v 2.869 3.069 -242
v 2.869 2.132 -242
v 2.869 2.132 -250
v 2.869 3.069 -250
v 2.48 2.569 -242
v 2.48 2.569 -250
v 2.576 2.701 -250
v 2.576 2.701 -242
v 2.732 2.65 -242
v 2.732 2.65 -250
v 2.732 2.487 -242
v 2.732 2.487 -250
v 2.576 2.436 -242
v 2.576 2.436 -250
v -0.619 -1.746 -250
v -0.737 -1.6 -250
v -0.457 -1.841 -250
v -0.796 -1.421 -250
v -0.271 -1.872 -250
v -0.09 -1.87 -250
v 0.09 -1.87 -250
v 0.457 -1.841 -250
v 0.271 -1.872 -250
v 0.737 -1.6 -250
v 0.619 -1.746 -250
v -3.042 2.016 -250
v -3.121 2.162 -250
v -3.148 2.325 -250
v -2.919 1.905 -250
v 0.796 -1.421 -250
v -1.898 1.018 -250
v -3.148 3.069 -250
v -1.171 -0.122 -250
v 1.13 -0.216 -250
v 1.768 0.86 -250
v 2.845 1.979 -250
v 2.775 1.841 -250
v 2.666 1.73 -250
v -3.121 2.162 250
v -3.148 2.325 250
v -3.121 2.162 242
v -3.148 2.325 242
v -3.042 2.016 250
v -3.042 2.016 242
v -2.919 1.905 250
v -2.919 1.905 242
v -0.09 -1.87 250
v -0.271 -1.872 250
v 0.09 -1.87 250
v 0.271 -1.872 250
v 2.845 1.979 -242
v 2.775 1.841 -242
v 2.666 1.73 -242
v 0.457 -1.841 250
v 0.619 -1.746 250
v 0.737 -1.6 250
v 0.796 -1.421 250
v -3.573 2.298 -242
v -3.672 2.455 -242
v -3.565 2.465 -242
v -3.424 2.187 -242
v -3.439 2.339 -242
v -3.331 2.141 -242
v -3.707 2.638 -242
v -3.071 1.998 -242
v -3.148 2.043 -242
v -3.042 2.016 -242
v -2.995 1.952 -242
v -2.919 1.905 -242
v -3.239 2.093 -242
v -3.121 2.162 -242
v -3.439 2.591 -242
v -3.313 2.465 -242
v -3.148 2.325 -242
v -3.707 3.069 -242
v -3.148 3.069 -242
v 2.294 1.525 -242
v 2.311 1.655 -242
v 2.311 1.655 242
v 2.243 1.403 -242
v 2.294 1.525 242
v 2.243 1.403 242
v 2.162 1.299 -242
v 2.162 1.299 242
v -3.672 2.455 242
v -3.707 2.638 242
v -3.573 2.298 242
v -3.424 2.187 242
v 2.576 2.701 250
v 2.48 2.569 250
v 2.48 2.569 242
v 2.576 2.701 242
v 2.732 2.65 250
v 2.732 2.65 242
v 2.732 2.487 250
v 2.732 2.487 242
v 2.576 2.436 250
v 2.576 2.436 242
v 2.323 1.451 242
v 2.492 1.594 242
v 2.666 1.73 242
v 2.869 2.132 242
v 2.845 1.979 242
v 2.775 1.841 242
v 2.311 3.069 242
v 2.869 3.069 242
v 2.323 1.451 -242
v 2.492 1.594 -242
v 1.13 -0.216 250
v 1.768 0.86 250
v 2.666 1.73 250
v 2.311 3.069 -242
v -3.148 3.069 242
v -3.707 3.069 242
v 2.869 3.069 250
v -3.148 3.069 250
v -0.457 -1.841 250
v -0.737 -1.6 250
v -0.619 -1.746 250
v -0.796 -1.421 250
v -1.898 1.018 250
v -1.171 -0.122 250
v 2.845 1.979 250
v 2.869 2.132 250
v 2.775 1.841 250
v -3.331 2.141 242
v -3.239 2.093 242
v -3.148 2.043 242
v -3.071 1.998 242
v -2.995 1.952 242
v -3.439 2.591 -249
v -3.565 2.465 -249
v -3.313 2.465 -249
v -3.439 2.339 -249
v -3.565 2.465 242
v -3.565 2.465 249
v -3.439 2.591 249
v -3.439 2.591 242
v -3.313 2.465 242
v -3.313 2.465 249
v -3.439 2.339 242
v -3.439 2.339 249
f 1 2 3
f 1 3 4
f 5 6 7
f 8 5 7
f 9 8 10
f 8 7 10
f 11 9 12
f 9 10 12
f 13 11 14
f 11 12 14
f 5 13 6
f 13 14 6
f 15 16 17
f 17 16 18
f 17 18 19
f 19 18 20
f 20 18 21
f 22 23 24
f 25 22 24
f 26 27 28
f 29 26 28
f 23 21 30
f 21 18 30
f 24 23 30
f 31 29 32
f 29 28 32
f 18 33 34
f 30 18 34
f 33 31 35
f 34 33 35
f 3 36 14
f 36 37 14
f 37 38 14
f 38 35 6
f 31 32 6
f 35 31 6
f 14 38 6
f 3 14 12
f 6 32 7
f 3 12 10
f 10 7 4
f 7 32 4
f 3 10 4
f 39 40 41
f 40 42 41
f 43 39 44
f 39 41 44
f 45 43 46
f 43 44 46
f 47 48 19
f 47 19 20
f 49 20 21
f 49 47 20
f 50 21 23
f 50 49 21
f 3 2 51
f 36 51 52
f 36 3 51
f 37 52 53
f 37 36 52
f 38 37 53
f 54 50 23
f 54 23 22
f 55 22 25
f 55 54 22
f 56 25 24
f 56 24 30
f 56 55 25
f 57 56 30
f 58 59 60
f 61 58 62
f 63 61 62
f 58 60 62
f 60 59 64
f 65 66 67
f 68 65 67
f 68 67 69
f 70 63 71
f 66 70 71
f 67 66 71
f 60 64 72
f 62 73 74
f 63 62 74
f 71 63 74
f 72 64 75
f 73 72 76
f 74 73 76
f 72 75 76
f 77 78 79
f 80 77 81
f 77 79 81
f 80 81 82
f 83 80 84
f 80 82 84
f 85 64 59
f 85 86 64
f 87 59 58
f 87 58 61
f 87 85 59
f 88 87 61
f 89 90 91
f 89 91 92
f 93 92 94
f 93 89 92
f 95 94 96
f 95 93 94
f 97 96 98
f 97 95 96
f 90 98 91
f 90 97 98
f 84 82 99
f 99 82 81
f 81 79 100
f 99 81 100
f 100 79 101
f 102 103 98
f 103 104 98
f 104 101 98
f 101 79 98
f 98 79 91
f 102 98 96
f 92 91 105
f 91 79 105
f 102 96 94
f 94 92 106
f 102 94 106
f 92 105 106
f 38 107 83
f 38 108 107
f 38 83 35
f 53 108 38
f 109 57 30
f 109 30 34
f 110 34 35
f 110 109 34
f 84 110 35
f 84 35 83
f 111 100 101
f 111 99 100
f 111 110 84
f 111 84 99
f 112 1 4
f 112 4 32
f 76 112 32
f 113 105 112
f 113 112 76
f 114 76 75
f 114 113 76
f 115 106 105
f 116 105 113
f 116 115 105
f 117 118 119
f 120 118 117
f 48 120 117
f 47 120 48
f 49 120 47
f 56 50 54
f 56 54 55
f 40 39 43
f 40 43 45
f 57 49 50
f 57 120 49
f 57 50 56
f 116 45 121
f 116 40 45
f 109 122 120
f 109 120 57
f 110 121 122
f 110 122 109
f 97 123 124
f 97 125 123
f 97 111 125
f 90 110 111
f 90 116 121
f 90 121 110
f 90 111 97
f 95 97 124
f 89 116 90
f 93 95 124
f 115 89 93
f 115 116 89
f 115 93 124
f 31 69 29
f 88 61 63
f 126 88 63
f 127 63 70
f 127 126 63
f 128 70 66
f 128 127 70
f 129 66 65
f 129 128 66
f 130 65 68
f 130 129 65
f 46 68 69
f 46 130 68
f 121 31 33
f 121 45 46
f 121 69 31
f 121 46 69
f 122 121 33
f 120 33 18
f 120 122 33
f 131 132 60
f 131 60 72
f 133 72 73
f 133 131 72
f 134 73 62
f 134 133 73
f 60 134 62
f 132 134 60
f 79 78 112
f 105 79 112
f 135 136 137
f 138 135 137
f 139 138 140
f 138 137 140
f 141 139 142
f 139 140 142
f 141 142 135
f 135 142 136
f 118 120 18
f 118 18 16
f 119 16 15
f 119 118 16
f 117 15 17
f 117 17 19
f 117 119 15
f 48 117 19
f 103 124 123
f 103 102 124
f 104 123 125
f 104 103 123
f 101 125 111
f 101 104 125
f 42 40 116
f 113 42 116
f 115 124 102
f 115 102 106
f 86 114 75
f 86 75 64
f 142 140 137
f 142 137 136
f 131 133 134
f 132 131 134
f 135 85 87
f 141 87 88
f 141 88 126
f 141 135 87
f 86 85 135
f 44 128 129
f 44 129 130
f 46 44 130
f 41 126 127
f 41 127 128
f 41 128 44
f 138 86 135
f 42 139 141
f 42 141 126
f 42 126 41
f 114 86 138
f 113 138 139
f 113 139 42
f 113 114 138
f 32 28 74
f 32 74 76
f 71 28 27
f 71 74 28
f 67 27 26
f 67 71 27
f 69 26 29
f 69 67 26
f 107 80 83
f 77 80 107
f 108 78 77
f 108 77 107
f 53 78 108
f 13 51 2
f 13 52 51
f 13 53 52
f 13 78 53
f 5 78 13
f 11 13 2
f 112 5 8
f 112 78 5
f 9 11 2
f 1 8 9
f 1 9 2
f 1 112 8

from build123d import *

# Parameters (mm, degrees)
BOSS_EXTRUDE1_DEPTH     = 250
CUT_EXTRUDE6_DEPTH      = 242
CUT_EXTRUDE6_DEPTH_BACK = 242
SKETCH9_W               = 0.558111167
SKETCH9_H               = 1.818787441
CUT_EXTRUDE7_START      = -8
SKETCH11_R              = 0.139327756
SKETCH11_R_2            = 0.125822814
CUT_EXTRUDE7_DEPTH      = 8
SKETCH13_R              = 0.125822814
CUT_EXTRUDE12_DEPTH     = 1
FILLET3_R               = 0.5


with BuildPart() as part:
    # Sketch1 → Boss-Extrude1 (new, symmetric)
    with BuildSketch(Plane.XY):
        with BuildLine():
            Line((2.869208069, 3.068545431), (-3.706559837, 3.068545431))
            Line((-3.706559837, 3.068545431), (-3.706559837, 2.312213583))
            ThreePointArc((-3.706559837, 2.312213583), (-1.749706829, 0.836593392), (-0.796044874, -1.421117289))
            ThreePointArc((-0.796044874, -1.421117289), (-0.61902671, -1.745895622), (-0.271314784, -1.872041617))
            ThreePointArc((-0.271314784, -1.872041617), (0, -1.870162722), (0.271314784, -1.872041617))
            ThreePointArc((0.271314784, -1.872041617), (0.61902671, -1.745895622), (0.796044874, -1.421117289))
            ThreePointArc((0.796044874, -1.421117289), (1.477625841, 0.448969612), (2.869208069, 1.872091721))
            Line((2.869208069, 1.872091721), (2.869208069, 3.068545431))
        make_face()
    extrude(amount=BOSS_EXTRUDE1_DEPTH, both=True)

    # Sketch9 → Cut-Extrude6 (cut, two sides: drawn at the far end of the back side and taken through both)
    with BuildSketch(Plane.XY.offset(-CUT_EXTRUDE6_DEPTH_BACK)):
        with Locations((2.590152485, 2.15915171)):
            Rectangle(SKETCH9_W, SKETCH9_H)
    extrude(amount=CUT_EXTRUDE6_DEPTH + CUT_EXTRUDE6_DEPTH_BACK, mode=Mode.SUBTRACT)

    # Sketch11 → Cut-Extrude7 (cut)
    # profile 1 of 2: a face of its own
    with BuildSketch(Plane(origin=(0, 0, 242), x_dir=(-1, 0, 0), z_dir=(0, 0, -1)).offset(CUT_EXTRUDE7_START)):
        with Locations((-2.619208069, 2.568545431)):
            Circle(SKETCH11_R)
    # profile 2 of 2: a face of its own
    with BuildSketch(Plane(origin=(0, 0, 242), x_dir=(-1, 0, 0), z_dir=(0, 0, -1)).offset(CUT_EXTRUDE7_START)):
        with BuildLine():
            Line((3.706559837, 3.068545431), (3.706559837, 2.312213583))
            ThreePointArc((3.706559837, 2.312213583), (3.423086279, 2.186837068), (3.14844867, 2.043133511))
            Line((3.14844867, 2.043133511), (3.14844867, 3.068545431))
            Line((3.14844867, 3.068545431), (3.706559837, 3.068545431))
        make_face()
        with Locations((3.438785788, 2.465008687)):
            Circle(SKETCH11_R_2, mode=Mode.SUBTRACT)
    cut_extrude7 = extrude(amount=CUT_EXTRUDE7_DEPTH, mode=Mode.SUBTRACT)

    # Sketch13 → Cut-Extrude12 (cut)
    with BuildSketch(Plane.XY.offset(250)):
        with Locations(Location((-3.438785788, 2.465008687, 0), (0, 0, 180))):
            Circle(SKETCH13_R)
    cut_extrude12 = extrude(amount=-CUT_EXTRUDE12_DEPTH, mode=Mode.SUBTRACT)

    # Mirror1: Cut-Extrude7, Cut-Extrude12 across plane
    add(cut_extrude7.mirror(Plane.XY), mode=Mode.SUBTRACT)
    add(cut_extrude12.mirror(Plane.XY), mode=Mode.SUBTRACT)

    # Fillet3
    fillet3_edges = [part.edges().sort_by_distance(p)[0] for p in [
        (-3.14844867, 2.043133511, -246),
        (2.869208069, 1.872091721, 246),
        (2.869208069, 1.872091721, -246),
        (2.311096902, 1.439762425, 0),
        (-3.706559837, 2.312213583, 0),
        (-3.14844867, 2.043133511, 246),
    ]]
    fillet(fillet3_edges, radius=FILLET3_R)


solid = part.part
